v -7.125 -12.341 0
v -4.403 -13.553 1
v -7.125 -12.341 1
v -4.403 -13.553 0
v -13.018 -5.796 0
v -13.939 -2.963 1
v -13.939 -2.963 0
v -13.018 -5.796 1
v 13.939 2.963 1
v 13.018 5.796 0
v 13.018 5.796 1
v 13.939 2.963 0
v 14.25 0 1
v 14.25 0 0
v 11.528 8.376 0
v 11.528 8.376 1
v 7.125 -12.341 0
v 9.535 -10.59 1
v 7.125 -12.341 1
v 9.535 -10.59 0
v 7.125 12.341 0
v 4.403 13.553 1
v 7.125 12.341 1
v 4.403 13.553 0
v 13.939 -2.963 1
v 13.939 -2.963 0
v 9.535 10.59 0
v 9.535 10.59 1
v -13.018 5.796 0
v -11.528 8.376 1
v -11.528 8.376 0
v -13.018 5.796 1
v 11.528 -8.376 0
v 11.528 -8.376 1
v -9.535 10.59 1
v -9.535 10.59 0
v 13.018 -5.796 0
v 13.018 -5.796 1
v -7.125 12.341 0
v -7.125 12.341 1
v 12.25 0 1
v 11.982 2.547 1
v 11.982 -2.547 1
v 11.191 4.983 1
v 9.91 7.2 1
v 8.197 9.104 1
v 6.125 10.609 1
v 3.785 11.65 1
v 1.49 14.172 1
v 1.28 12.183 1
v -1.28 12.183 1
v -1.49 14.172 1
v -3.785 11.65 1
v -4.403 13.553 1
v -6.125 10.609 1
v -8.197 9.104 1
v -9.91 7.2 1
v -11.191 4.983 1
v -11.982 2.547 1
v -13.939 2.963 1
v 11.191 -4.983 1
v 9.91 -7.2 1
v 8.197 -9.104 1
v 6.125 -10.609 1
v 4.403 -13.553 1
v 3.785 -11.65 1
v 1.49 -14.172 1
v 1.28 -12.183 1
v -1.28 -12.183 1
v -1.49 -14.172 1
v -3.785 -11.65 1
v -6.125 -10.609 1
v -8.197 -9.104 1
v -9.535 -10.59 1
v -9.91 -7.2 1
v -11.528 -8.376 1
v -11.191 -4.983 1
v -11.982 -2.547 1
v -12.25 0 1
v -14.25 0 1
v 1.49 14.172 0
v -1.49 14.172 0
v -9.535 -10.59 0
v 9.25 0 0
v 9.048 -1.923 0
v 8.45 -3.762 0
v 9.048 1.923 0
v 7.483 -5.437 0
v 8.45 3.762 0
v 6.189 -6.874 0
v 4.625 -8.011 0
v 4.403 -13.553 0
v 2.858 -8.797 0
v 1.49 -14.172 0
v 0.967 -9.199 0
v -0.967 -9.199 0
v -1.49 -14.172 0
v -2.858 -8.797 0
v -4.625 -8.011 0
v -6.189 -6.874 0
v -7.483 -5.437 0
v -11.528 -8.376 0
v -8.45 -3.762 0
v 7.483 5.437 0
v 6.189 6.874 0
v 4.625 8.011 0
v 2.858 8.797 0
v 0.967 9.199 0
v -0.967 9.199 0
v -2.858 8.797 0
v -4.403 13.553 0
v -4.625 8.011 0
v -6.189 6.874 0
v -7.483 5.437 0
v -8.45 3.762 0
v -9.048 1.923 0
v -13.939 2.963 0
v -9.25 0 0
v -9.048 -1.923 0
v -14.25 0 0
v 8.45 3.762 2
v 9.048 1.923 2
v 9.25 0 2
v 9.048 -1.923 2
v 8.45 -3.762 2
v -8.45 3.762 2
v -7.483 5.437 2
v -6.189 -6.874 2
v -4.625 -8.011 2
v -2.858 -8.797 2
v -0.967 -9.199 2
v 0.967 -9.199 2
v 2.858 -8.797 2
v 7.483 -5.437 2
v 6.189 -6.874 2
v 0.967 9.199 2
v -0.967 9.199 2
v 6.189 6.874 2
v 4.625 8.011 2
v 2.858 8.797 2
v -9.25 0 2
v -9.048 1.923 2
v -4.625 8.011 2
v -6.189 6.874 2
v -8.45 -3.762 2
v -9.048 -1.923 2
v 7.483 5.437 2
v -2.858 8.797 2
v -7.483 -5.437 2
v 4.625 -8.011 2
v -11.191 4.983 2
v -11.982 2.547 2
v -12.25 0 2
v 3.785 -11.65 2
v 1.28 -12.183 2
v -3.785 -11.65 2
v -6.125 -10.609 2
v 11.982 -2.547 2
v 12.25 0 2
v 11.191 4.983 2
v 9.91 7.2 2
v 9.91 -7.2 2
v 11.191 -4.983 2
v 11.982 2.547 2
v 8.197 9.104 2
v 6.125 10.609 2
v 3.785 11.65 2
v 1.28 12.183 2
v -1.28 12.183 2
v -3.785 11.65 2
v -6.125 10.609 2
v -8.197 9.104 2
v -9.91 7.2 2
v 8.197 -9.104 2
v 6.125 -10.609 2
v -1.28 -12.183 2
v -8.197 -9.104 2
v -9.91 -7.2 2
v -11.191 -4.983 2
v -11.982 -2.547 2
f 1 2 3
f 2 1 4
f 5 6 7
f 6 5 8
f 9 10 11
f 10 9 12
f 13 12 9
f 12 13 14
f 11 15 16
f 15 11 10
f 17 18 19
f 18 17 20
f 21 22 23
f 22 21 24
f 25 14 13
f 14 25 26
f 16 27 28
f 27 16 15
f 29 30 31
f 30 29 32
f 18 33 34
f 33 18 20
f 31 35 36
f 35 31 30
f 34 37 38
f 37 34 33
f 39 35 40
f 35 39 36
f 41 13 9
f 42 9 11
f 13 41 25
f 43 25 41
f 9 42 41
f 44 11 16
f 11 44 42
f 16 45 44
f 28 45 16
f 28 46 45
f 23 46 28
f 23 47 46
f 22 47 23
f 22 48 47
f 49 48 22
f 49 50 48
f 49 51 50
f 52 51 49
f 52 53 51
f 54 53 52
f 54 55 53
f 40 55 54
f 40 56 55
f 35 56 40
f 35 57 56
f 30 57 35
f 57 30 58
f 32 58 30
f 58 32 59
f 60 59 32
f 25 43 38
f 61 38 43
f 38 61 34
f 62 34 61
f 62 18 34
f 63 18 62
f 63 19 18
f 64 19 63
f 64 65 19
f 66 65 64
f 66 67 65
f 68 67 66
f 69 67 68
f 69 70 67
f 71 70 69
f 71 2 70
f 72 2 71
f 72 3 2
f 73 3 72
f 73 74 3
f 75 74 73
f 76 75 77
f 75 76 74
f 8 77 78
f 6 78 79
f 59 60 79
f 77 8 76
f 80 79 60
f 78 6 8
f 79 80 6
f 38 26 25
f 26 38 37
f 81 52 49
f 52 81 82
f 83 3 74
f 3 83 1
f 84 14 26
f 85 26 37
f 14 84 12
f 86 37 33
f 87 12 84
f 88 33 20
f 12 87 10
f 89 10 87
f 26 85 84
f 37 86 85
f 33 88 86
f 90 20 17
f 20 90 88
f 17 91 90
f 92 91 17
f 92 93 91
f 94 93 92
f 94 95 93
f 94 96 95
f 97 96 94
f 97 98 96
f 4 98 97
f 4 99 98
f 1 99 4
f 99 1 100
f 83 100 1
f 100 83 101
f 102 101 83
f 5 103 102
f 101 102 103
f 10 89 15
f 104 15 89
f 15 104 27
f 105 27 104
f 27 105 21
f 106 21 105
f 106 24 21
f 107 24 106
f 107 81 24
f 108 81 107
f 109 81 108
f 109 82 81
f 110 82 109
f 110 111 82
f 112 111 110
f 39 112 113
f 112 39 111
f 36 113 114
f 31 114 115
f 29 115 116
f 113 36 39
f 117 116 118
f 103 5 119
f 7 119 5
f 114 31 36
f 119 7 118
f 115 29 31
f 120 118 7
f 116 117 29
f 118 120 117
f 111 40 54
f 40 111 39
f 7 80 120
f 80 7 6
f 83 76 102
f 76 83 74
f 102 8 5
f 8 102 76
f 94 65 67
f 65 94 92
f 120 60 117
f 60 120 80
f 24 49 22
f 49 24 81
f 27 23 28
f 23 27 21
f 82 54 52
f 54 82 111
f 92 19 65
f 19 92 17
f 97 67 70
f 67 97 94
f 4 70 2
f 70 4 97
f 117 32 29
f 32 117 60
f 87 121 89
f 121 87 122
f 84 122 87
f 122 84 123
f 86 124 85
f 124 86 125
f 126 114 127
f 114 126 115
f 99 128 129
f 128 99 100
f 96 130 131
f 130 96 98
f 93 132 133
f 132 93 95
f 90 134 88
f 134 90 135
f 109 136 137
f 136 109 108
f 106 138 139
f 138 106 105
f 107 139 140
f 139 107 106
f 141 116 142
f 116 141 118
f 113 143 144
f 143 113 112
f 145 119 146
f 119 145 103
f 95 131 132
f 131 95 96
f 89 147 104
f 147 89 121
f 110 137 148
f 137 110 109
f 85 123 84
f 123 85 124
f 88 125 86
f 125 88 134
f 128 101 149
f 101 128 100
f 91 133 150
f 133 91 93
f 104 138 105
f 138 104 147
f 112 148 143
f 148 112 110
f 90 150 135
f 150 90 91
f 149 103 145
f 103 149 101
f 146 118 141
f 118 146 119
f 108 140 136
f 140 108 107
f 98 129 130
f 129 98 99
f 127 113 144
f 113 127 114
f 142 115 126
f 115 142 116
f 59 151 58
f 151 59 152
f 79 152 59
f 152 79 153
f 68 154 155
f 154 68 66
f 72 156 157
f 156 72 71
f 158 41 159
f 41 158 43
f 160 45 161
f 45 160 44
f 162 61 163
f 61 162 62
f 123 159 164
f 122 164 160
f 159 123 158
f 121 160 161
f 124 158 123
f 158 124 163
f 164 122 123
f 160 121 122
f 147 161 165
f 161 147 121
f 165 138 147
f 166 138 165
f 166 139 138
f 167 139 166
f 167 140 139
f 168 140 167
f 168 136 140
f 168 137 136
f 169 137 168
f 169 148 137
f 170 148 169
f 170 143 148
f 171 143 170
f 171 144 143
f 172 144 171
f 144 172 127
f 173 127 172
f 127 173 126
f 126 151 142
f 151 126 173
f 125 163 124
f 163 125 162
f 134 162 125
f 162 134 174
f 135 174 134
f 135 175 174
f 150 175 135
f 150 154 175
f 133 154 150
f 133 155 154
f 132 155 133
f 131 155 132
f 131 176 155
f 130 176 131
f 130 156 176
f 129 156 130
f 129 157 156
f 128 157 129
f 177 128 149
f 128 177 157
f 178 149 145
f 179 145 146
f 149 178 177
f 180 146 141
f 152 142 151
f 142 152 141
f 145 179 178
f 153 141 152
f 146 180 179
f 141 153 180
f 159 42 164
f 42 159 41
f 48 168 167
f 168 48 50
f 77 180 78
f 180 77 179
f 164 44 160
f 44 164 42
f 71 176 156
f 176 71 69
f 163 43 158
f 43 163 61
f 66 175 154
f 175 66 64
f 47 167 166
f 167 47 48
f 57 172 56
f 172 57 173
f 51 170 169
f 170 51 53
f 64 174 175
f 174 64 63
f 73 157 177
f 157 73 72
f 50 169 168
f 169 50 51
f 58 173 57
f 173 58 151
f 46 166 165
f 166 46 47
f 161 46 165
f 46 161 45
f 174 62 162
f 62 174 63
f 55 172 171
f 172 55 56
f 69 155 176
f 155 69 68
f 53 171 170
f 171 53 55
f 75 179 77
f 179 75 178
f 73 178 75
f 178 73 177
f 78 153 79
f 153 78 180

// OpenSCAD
// part_id: dat7
// name: Date pointer friction ring (outer)
// source_drawing_ids: DRW-008
// units: mm
// revision: 0.1
// SPDX-License-Identifier: MIT

module part_dat7(
    outer_d = 28.5,
    inner_d = 18.5,
    base_h = 1.0,
    shoulder_od = 24.5,
    shoulder_h = 1.0,
    rivet_d = 1.0,
    rivet_pcd = 17.0,
    rivet_count = 4
) {
    difference() {
        union() {
            difference() {
                cylinder(d = outer_d, h = base_h, center = false);
                translate([0, 0, -0.05]) cylinder(d = inner_d, h = base_h + 0.1, center = false);
            }

            translate([0, 0, base_h])
            difference() {
                cylinder(d = shoulder_od, h = shoulder_h, center = false);
                translate([0, 0, -0.05]) cylinder(d = inner_d, h = shoulder_h + 0.1, center = false);
            }
        }

        for (i = [0 : rivet_count - 1]) {
            a = i * 360 / rivet_count;
            translate([
                (rivet_pcd / 2) * cos(a),
                (rivet_pcd / 2) * sin(a),
                -0.1
            ]) cylinder(d = rivet_d, h = base_h + shoulder_h + 0.2, center = false, $fn = 20);
        }
    }
}

// ---- "main guard" ----
// Default to previewing when opened directly:
if (is_undef(__LIB_MODE__)) {
    part_dat7();
}
